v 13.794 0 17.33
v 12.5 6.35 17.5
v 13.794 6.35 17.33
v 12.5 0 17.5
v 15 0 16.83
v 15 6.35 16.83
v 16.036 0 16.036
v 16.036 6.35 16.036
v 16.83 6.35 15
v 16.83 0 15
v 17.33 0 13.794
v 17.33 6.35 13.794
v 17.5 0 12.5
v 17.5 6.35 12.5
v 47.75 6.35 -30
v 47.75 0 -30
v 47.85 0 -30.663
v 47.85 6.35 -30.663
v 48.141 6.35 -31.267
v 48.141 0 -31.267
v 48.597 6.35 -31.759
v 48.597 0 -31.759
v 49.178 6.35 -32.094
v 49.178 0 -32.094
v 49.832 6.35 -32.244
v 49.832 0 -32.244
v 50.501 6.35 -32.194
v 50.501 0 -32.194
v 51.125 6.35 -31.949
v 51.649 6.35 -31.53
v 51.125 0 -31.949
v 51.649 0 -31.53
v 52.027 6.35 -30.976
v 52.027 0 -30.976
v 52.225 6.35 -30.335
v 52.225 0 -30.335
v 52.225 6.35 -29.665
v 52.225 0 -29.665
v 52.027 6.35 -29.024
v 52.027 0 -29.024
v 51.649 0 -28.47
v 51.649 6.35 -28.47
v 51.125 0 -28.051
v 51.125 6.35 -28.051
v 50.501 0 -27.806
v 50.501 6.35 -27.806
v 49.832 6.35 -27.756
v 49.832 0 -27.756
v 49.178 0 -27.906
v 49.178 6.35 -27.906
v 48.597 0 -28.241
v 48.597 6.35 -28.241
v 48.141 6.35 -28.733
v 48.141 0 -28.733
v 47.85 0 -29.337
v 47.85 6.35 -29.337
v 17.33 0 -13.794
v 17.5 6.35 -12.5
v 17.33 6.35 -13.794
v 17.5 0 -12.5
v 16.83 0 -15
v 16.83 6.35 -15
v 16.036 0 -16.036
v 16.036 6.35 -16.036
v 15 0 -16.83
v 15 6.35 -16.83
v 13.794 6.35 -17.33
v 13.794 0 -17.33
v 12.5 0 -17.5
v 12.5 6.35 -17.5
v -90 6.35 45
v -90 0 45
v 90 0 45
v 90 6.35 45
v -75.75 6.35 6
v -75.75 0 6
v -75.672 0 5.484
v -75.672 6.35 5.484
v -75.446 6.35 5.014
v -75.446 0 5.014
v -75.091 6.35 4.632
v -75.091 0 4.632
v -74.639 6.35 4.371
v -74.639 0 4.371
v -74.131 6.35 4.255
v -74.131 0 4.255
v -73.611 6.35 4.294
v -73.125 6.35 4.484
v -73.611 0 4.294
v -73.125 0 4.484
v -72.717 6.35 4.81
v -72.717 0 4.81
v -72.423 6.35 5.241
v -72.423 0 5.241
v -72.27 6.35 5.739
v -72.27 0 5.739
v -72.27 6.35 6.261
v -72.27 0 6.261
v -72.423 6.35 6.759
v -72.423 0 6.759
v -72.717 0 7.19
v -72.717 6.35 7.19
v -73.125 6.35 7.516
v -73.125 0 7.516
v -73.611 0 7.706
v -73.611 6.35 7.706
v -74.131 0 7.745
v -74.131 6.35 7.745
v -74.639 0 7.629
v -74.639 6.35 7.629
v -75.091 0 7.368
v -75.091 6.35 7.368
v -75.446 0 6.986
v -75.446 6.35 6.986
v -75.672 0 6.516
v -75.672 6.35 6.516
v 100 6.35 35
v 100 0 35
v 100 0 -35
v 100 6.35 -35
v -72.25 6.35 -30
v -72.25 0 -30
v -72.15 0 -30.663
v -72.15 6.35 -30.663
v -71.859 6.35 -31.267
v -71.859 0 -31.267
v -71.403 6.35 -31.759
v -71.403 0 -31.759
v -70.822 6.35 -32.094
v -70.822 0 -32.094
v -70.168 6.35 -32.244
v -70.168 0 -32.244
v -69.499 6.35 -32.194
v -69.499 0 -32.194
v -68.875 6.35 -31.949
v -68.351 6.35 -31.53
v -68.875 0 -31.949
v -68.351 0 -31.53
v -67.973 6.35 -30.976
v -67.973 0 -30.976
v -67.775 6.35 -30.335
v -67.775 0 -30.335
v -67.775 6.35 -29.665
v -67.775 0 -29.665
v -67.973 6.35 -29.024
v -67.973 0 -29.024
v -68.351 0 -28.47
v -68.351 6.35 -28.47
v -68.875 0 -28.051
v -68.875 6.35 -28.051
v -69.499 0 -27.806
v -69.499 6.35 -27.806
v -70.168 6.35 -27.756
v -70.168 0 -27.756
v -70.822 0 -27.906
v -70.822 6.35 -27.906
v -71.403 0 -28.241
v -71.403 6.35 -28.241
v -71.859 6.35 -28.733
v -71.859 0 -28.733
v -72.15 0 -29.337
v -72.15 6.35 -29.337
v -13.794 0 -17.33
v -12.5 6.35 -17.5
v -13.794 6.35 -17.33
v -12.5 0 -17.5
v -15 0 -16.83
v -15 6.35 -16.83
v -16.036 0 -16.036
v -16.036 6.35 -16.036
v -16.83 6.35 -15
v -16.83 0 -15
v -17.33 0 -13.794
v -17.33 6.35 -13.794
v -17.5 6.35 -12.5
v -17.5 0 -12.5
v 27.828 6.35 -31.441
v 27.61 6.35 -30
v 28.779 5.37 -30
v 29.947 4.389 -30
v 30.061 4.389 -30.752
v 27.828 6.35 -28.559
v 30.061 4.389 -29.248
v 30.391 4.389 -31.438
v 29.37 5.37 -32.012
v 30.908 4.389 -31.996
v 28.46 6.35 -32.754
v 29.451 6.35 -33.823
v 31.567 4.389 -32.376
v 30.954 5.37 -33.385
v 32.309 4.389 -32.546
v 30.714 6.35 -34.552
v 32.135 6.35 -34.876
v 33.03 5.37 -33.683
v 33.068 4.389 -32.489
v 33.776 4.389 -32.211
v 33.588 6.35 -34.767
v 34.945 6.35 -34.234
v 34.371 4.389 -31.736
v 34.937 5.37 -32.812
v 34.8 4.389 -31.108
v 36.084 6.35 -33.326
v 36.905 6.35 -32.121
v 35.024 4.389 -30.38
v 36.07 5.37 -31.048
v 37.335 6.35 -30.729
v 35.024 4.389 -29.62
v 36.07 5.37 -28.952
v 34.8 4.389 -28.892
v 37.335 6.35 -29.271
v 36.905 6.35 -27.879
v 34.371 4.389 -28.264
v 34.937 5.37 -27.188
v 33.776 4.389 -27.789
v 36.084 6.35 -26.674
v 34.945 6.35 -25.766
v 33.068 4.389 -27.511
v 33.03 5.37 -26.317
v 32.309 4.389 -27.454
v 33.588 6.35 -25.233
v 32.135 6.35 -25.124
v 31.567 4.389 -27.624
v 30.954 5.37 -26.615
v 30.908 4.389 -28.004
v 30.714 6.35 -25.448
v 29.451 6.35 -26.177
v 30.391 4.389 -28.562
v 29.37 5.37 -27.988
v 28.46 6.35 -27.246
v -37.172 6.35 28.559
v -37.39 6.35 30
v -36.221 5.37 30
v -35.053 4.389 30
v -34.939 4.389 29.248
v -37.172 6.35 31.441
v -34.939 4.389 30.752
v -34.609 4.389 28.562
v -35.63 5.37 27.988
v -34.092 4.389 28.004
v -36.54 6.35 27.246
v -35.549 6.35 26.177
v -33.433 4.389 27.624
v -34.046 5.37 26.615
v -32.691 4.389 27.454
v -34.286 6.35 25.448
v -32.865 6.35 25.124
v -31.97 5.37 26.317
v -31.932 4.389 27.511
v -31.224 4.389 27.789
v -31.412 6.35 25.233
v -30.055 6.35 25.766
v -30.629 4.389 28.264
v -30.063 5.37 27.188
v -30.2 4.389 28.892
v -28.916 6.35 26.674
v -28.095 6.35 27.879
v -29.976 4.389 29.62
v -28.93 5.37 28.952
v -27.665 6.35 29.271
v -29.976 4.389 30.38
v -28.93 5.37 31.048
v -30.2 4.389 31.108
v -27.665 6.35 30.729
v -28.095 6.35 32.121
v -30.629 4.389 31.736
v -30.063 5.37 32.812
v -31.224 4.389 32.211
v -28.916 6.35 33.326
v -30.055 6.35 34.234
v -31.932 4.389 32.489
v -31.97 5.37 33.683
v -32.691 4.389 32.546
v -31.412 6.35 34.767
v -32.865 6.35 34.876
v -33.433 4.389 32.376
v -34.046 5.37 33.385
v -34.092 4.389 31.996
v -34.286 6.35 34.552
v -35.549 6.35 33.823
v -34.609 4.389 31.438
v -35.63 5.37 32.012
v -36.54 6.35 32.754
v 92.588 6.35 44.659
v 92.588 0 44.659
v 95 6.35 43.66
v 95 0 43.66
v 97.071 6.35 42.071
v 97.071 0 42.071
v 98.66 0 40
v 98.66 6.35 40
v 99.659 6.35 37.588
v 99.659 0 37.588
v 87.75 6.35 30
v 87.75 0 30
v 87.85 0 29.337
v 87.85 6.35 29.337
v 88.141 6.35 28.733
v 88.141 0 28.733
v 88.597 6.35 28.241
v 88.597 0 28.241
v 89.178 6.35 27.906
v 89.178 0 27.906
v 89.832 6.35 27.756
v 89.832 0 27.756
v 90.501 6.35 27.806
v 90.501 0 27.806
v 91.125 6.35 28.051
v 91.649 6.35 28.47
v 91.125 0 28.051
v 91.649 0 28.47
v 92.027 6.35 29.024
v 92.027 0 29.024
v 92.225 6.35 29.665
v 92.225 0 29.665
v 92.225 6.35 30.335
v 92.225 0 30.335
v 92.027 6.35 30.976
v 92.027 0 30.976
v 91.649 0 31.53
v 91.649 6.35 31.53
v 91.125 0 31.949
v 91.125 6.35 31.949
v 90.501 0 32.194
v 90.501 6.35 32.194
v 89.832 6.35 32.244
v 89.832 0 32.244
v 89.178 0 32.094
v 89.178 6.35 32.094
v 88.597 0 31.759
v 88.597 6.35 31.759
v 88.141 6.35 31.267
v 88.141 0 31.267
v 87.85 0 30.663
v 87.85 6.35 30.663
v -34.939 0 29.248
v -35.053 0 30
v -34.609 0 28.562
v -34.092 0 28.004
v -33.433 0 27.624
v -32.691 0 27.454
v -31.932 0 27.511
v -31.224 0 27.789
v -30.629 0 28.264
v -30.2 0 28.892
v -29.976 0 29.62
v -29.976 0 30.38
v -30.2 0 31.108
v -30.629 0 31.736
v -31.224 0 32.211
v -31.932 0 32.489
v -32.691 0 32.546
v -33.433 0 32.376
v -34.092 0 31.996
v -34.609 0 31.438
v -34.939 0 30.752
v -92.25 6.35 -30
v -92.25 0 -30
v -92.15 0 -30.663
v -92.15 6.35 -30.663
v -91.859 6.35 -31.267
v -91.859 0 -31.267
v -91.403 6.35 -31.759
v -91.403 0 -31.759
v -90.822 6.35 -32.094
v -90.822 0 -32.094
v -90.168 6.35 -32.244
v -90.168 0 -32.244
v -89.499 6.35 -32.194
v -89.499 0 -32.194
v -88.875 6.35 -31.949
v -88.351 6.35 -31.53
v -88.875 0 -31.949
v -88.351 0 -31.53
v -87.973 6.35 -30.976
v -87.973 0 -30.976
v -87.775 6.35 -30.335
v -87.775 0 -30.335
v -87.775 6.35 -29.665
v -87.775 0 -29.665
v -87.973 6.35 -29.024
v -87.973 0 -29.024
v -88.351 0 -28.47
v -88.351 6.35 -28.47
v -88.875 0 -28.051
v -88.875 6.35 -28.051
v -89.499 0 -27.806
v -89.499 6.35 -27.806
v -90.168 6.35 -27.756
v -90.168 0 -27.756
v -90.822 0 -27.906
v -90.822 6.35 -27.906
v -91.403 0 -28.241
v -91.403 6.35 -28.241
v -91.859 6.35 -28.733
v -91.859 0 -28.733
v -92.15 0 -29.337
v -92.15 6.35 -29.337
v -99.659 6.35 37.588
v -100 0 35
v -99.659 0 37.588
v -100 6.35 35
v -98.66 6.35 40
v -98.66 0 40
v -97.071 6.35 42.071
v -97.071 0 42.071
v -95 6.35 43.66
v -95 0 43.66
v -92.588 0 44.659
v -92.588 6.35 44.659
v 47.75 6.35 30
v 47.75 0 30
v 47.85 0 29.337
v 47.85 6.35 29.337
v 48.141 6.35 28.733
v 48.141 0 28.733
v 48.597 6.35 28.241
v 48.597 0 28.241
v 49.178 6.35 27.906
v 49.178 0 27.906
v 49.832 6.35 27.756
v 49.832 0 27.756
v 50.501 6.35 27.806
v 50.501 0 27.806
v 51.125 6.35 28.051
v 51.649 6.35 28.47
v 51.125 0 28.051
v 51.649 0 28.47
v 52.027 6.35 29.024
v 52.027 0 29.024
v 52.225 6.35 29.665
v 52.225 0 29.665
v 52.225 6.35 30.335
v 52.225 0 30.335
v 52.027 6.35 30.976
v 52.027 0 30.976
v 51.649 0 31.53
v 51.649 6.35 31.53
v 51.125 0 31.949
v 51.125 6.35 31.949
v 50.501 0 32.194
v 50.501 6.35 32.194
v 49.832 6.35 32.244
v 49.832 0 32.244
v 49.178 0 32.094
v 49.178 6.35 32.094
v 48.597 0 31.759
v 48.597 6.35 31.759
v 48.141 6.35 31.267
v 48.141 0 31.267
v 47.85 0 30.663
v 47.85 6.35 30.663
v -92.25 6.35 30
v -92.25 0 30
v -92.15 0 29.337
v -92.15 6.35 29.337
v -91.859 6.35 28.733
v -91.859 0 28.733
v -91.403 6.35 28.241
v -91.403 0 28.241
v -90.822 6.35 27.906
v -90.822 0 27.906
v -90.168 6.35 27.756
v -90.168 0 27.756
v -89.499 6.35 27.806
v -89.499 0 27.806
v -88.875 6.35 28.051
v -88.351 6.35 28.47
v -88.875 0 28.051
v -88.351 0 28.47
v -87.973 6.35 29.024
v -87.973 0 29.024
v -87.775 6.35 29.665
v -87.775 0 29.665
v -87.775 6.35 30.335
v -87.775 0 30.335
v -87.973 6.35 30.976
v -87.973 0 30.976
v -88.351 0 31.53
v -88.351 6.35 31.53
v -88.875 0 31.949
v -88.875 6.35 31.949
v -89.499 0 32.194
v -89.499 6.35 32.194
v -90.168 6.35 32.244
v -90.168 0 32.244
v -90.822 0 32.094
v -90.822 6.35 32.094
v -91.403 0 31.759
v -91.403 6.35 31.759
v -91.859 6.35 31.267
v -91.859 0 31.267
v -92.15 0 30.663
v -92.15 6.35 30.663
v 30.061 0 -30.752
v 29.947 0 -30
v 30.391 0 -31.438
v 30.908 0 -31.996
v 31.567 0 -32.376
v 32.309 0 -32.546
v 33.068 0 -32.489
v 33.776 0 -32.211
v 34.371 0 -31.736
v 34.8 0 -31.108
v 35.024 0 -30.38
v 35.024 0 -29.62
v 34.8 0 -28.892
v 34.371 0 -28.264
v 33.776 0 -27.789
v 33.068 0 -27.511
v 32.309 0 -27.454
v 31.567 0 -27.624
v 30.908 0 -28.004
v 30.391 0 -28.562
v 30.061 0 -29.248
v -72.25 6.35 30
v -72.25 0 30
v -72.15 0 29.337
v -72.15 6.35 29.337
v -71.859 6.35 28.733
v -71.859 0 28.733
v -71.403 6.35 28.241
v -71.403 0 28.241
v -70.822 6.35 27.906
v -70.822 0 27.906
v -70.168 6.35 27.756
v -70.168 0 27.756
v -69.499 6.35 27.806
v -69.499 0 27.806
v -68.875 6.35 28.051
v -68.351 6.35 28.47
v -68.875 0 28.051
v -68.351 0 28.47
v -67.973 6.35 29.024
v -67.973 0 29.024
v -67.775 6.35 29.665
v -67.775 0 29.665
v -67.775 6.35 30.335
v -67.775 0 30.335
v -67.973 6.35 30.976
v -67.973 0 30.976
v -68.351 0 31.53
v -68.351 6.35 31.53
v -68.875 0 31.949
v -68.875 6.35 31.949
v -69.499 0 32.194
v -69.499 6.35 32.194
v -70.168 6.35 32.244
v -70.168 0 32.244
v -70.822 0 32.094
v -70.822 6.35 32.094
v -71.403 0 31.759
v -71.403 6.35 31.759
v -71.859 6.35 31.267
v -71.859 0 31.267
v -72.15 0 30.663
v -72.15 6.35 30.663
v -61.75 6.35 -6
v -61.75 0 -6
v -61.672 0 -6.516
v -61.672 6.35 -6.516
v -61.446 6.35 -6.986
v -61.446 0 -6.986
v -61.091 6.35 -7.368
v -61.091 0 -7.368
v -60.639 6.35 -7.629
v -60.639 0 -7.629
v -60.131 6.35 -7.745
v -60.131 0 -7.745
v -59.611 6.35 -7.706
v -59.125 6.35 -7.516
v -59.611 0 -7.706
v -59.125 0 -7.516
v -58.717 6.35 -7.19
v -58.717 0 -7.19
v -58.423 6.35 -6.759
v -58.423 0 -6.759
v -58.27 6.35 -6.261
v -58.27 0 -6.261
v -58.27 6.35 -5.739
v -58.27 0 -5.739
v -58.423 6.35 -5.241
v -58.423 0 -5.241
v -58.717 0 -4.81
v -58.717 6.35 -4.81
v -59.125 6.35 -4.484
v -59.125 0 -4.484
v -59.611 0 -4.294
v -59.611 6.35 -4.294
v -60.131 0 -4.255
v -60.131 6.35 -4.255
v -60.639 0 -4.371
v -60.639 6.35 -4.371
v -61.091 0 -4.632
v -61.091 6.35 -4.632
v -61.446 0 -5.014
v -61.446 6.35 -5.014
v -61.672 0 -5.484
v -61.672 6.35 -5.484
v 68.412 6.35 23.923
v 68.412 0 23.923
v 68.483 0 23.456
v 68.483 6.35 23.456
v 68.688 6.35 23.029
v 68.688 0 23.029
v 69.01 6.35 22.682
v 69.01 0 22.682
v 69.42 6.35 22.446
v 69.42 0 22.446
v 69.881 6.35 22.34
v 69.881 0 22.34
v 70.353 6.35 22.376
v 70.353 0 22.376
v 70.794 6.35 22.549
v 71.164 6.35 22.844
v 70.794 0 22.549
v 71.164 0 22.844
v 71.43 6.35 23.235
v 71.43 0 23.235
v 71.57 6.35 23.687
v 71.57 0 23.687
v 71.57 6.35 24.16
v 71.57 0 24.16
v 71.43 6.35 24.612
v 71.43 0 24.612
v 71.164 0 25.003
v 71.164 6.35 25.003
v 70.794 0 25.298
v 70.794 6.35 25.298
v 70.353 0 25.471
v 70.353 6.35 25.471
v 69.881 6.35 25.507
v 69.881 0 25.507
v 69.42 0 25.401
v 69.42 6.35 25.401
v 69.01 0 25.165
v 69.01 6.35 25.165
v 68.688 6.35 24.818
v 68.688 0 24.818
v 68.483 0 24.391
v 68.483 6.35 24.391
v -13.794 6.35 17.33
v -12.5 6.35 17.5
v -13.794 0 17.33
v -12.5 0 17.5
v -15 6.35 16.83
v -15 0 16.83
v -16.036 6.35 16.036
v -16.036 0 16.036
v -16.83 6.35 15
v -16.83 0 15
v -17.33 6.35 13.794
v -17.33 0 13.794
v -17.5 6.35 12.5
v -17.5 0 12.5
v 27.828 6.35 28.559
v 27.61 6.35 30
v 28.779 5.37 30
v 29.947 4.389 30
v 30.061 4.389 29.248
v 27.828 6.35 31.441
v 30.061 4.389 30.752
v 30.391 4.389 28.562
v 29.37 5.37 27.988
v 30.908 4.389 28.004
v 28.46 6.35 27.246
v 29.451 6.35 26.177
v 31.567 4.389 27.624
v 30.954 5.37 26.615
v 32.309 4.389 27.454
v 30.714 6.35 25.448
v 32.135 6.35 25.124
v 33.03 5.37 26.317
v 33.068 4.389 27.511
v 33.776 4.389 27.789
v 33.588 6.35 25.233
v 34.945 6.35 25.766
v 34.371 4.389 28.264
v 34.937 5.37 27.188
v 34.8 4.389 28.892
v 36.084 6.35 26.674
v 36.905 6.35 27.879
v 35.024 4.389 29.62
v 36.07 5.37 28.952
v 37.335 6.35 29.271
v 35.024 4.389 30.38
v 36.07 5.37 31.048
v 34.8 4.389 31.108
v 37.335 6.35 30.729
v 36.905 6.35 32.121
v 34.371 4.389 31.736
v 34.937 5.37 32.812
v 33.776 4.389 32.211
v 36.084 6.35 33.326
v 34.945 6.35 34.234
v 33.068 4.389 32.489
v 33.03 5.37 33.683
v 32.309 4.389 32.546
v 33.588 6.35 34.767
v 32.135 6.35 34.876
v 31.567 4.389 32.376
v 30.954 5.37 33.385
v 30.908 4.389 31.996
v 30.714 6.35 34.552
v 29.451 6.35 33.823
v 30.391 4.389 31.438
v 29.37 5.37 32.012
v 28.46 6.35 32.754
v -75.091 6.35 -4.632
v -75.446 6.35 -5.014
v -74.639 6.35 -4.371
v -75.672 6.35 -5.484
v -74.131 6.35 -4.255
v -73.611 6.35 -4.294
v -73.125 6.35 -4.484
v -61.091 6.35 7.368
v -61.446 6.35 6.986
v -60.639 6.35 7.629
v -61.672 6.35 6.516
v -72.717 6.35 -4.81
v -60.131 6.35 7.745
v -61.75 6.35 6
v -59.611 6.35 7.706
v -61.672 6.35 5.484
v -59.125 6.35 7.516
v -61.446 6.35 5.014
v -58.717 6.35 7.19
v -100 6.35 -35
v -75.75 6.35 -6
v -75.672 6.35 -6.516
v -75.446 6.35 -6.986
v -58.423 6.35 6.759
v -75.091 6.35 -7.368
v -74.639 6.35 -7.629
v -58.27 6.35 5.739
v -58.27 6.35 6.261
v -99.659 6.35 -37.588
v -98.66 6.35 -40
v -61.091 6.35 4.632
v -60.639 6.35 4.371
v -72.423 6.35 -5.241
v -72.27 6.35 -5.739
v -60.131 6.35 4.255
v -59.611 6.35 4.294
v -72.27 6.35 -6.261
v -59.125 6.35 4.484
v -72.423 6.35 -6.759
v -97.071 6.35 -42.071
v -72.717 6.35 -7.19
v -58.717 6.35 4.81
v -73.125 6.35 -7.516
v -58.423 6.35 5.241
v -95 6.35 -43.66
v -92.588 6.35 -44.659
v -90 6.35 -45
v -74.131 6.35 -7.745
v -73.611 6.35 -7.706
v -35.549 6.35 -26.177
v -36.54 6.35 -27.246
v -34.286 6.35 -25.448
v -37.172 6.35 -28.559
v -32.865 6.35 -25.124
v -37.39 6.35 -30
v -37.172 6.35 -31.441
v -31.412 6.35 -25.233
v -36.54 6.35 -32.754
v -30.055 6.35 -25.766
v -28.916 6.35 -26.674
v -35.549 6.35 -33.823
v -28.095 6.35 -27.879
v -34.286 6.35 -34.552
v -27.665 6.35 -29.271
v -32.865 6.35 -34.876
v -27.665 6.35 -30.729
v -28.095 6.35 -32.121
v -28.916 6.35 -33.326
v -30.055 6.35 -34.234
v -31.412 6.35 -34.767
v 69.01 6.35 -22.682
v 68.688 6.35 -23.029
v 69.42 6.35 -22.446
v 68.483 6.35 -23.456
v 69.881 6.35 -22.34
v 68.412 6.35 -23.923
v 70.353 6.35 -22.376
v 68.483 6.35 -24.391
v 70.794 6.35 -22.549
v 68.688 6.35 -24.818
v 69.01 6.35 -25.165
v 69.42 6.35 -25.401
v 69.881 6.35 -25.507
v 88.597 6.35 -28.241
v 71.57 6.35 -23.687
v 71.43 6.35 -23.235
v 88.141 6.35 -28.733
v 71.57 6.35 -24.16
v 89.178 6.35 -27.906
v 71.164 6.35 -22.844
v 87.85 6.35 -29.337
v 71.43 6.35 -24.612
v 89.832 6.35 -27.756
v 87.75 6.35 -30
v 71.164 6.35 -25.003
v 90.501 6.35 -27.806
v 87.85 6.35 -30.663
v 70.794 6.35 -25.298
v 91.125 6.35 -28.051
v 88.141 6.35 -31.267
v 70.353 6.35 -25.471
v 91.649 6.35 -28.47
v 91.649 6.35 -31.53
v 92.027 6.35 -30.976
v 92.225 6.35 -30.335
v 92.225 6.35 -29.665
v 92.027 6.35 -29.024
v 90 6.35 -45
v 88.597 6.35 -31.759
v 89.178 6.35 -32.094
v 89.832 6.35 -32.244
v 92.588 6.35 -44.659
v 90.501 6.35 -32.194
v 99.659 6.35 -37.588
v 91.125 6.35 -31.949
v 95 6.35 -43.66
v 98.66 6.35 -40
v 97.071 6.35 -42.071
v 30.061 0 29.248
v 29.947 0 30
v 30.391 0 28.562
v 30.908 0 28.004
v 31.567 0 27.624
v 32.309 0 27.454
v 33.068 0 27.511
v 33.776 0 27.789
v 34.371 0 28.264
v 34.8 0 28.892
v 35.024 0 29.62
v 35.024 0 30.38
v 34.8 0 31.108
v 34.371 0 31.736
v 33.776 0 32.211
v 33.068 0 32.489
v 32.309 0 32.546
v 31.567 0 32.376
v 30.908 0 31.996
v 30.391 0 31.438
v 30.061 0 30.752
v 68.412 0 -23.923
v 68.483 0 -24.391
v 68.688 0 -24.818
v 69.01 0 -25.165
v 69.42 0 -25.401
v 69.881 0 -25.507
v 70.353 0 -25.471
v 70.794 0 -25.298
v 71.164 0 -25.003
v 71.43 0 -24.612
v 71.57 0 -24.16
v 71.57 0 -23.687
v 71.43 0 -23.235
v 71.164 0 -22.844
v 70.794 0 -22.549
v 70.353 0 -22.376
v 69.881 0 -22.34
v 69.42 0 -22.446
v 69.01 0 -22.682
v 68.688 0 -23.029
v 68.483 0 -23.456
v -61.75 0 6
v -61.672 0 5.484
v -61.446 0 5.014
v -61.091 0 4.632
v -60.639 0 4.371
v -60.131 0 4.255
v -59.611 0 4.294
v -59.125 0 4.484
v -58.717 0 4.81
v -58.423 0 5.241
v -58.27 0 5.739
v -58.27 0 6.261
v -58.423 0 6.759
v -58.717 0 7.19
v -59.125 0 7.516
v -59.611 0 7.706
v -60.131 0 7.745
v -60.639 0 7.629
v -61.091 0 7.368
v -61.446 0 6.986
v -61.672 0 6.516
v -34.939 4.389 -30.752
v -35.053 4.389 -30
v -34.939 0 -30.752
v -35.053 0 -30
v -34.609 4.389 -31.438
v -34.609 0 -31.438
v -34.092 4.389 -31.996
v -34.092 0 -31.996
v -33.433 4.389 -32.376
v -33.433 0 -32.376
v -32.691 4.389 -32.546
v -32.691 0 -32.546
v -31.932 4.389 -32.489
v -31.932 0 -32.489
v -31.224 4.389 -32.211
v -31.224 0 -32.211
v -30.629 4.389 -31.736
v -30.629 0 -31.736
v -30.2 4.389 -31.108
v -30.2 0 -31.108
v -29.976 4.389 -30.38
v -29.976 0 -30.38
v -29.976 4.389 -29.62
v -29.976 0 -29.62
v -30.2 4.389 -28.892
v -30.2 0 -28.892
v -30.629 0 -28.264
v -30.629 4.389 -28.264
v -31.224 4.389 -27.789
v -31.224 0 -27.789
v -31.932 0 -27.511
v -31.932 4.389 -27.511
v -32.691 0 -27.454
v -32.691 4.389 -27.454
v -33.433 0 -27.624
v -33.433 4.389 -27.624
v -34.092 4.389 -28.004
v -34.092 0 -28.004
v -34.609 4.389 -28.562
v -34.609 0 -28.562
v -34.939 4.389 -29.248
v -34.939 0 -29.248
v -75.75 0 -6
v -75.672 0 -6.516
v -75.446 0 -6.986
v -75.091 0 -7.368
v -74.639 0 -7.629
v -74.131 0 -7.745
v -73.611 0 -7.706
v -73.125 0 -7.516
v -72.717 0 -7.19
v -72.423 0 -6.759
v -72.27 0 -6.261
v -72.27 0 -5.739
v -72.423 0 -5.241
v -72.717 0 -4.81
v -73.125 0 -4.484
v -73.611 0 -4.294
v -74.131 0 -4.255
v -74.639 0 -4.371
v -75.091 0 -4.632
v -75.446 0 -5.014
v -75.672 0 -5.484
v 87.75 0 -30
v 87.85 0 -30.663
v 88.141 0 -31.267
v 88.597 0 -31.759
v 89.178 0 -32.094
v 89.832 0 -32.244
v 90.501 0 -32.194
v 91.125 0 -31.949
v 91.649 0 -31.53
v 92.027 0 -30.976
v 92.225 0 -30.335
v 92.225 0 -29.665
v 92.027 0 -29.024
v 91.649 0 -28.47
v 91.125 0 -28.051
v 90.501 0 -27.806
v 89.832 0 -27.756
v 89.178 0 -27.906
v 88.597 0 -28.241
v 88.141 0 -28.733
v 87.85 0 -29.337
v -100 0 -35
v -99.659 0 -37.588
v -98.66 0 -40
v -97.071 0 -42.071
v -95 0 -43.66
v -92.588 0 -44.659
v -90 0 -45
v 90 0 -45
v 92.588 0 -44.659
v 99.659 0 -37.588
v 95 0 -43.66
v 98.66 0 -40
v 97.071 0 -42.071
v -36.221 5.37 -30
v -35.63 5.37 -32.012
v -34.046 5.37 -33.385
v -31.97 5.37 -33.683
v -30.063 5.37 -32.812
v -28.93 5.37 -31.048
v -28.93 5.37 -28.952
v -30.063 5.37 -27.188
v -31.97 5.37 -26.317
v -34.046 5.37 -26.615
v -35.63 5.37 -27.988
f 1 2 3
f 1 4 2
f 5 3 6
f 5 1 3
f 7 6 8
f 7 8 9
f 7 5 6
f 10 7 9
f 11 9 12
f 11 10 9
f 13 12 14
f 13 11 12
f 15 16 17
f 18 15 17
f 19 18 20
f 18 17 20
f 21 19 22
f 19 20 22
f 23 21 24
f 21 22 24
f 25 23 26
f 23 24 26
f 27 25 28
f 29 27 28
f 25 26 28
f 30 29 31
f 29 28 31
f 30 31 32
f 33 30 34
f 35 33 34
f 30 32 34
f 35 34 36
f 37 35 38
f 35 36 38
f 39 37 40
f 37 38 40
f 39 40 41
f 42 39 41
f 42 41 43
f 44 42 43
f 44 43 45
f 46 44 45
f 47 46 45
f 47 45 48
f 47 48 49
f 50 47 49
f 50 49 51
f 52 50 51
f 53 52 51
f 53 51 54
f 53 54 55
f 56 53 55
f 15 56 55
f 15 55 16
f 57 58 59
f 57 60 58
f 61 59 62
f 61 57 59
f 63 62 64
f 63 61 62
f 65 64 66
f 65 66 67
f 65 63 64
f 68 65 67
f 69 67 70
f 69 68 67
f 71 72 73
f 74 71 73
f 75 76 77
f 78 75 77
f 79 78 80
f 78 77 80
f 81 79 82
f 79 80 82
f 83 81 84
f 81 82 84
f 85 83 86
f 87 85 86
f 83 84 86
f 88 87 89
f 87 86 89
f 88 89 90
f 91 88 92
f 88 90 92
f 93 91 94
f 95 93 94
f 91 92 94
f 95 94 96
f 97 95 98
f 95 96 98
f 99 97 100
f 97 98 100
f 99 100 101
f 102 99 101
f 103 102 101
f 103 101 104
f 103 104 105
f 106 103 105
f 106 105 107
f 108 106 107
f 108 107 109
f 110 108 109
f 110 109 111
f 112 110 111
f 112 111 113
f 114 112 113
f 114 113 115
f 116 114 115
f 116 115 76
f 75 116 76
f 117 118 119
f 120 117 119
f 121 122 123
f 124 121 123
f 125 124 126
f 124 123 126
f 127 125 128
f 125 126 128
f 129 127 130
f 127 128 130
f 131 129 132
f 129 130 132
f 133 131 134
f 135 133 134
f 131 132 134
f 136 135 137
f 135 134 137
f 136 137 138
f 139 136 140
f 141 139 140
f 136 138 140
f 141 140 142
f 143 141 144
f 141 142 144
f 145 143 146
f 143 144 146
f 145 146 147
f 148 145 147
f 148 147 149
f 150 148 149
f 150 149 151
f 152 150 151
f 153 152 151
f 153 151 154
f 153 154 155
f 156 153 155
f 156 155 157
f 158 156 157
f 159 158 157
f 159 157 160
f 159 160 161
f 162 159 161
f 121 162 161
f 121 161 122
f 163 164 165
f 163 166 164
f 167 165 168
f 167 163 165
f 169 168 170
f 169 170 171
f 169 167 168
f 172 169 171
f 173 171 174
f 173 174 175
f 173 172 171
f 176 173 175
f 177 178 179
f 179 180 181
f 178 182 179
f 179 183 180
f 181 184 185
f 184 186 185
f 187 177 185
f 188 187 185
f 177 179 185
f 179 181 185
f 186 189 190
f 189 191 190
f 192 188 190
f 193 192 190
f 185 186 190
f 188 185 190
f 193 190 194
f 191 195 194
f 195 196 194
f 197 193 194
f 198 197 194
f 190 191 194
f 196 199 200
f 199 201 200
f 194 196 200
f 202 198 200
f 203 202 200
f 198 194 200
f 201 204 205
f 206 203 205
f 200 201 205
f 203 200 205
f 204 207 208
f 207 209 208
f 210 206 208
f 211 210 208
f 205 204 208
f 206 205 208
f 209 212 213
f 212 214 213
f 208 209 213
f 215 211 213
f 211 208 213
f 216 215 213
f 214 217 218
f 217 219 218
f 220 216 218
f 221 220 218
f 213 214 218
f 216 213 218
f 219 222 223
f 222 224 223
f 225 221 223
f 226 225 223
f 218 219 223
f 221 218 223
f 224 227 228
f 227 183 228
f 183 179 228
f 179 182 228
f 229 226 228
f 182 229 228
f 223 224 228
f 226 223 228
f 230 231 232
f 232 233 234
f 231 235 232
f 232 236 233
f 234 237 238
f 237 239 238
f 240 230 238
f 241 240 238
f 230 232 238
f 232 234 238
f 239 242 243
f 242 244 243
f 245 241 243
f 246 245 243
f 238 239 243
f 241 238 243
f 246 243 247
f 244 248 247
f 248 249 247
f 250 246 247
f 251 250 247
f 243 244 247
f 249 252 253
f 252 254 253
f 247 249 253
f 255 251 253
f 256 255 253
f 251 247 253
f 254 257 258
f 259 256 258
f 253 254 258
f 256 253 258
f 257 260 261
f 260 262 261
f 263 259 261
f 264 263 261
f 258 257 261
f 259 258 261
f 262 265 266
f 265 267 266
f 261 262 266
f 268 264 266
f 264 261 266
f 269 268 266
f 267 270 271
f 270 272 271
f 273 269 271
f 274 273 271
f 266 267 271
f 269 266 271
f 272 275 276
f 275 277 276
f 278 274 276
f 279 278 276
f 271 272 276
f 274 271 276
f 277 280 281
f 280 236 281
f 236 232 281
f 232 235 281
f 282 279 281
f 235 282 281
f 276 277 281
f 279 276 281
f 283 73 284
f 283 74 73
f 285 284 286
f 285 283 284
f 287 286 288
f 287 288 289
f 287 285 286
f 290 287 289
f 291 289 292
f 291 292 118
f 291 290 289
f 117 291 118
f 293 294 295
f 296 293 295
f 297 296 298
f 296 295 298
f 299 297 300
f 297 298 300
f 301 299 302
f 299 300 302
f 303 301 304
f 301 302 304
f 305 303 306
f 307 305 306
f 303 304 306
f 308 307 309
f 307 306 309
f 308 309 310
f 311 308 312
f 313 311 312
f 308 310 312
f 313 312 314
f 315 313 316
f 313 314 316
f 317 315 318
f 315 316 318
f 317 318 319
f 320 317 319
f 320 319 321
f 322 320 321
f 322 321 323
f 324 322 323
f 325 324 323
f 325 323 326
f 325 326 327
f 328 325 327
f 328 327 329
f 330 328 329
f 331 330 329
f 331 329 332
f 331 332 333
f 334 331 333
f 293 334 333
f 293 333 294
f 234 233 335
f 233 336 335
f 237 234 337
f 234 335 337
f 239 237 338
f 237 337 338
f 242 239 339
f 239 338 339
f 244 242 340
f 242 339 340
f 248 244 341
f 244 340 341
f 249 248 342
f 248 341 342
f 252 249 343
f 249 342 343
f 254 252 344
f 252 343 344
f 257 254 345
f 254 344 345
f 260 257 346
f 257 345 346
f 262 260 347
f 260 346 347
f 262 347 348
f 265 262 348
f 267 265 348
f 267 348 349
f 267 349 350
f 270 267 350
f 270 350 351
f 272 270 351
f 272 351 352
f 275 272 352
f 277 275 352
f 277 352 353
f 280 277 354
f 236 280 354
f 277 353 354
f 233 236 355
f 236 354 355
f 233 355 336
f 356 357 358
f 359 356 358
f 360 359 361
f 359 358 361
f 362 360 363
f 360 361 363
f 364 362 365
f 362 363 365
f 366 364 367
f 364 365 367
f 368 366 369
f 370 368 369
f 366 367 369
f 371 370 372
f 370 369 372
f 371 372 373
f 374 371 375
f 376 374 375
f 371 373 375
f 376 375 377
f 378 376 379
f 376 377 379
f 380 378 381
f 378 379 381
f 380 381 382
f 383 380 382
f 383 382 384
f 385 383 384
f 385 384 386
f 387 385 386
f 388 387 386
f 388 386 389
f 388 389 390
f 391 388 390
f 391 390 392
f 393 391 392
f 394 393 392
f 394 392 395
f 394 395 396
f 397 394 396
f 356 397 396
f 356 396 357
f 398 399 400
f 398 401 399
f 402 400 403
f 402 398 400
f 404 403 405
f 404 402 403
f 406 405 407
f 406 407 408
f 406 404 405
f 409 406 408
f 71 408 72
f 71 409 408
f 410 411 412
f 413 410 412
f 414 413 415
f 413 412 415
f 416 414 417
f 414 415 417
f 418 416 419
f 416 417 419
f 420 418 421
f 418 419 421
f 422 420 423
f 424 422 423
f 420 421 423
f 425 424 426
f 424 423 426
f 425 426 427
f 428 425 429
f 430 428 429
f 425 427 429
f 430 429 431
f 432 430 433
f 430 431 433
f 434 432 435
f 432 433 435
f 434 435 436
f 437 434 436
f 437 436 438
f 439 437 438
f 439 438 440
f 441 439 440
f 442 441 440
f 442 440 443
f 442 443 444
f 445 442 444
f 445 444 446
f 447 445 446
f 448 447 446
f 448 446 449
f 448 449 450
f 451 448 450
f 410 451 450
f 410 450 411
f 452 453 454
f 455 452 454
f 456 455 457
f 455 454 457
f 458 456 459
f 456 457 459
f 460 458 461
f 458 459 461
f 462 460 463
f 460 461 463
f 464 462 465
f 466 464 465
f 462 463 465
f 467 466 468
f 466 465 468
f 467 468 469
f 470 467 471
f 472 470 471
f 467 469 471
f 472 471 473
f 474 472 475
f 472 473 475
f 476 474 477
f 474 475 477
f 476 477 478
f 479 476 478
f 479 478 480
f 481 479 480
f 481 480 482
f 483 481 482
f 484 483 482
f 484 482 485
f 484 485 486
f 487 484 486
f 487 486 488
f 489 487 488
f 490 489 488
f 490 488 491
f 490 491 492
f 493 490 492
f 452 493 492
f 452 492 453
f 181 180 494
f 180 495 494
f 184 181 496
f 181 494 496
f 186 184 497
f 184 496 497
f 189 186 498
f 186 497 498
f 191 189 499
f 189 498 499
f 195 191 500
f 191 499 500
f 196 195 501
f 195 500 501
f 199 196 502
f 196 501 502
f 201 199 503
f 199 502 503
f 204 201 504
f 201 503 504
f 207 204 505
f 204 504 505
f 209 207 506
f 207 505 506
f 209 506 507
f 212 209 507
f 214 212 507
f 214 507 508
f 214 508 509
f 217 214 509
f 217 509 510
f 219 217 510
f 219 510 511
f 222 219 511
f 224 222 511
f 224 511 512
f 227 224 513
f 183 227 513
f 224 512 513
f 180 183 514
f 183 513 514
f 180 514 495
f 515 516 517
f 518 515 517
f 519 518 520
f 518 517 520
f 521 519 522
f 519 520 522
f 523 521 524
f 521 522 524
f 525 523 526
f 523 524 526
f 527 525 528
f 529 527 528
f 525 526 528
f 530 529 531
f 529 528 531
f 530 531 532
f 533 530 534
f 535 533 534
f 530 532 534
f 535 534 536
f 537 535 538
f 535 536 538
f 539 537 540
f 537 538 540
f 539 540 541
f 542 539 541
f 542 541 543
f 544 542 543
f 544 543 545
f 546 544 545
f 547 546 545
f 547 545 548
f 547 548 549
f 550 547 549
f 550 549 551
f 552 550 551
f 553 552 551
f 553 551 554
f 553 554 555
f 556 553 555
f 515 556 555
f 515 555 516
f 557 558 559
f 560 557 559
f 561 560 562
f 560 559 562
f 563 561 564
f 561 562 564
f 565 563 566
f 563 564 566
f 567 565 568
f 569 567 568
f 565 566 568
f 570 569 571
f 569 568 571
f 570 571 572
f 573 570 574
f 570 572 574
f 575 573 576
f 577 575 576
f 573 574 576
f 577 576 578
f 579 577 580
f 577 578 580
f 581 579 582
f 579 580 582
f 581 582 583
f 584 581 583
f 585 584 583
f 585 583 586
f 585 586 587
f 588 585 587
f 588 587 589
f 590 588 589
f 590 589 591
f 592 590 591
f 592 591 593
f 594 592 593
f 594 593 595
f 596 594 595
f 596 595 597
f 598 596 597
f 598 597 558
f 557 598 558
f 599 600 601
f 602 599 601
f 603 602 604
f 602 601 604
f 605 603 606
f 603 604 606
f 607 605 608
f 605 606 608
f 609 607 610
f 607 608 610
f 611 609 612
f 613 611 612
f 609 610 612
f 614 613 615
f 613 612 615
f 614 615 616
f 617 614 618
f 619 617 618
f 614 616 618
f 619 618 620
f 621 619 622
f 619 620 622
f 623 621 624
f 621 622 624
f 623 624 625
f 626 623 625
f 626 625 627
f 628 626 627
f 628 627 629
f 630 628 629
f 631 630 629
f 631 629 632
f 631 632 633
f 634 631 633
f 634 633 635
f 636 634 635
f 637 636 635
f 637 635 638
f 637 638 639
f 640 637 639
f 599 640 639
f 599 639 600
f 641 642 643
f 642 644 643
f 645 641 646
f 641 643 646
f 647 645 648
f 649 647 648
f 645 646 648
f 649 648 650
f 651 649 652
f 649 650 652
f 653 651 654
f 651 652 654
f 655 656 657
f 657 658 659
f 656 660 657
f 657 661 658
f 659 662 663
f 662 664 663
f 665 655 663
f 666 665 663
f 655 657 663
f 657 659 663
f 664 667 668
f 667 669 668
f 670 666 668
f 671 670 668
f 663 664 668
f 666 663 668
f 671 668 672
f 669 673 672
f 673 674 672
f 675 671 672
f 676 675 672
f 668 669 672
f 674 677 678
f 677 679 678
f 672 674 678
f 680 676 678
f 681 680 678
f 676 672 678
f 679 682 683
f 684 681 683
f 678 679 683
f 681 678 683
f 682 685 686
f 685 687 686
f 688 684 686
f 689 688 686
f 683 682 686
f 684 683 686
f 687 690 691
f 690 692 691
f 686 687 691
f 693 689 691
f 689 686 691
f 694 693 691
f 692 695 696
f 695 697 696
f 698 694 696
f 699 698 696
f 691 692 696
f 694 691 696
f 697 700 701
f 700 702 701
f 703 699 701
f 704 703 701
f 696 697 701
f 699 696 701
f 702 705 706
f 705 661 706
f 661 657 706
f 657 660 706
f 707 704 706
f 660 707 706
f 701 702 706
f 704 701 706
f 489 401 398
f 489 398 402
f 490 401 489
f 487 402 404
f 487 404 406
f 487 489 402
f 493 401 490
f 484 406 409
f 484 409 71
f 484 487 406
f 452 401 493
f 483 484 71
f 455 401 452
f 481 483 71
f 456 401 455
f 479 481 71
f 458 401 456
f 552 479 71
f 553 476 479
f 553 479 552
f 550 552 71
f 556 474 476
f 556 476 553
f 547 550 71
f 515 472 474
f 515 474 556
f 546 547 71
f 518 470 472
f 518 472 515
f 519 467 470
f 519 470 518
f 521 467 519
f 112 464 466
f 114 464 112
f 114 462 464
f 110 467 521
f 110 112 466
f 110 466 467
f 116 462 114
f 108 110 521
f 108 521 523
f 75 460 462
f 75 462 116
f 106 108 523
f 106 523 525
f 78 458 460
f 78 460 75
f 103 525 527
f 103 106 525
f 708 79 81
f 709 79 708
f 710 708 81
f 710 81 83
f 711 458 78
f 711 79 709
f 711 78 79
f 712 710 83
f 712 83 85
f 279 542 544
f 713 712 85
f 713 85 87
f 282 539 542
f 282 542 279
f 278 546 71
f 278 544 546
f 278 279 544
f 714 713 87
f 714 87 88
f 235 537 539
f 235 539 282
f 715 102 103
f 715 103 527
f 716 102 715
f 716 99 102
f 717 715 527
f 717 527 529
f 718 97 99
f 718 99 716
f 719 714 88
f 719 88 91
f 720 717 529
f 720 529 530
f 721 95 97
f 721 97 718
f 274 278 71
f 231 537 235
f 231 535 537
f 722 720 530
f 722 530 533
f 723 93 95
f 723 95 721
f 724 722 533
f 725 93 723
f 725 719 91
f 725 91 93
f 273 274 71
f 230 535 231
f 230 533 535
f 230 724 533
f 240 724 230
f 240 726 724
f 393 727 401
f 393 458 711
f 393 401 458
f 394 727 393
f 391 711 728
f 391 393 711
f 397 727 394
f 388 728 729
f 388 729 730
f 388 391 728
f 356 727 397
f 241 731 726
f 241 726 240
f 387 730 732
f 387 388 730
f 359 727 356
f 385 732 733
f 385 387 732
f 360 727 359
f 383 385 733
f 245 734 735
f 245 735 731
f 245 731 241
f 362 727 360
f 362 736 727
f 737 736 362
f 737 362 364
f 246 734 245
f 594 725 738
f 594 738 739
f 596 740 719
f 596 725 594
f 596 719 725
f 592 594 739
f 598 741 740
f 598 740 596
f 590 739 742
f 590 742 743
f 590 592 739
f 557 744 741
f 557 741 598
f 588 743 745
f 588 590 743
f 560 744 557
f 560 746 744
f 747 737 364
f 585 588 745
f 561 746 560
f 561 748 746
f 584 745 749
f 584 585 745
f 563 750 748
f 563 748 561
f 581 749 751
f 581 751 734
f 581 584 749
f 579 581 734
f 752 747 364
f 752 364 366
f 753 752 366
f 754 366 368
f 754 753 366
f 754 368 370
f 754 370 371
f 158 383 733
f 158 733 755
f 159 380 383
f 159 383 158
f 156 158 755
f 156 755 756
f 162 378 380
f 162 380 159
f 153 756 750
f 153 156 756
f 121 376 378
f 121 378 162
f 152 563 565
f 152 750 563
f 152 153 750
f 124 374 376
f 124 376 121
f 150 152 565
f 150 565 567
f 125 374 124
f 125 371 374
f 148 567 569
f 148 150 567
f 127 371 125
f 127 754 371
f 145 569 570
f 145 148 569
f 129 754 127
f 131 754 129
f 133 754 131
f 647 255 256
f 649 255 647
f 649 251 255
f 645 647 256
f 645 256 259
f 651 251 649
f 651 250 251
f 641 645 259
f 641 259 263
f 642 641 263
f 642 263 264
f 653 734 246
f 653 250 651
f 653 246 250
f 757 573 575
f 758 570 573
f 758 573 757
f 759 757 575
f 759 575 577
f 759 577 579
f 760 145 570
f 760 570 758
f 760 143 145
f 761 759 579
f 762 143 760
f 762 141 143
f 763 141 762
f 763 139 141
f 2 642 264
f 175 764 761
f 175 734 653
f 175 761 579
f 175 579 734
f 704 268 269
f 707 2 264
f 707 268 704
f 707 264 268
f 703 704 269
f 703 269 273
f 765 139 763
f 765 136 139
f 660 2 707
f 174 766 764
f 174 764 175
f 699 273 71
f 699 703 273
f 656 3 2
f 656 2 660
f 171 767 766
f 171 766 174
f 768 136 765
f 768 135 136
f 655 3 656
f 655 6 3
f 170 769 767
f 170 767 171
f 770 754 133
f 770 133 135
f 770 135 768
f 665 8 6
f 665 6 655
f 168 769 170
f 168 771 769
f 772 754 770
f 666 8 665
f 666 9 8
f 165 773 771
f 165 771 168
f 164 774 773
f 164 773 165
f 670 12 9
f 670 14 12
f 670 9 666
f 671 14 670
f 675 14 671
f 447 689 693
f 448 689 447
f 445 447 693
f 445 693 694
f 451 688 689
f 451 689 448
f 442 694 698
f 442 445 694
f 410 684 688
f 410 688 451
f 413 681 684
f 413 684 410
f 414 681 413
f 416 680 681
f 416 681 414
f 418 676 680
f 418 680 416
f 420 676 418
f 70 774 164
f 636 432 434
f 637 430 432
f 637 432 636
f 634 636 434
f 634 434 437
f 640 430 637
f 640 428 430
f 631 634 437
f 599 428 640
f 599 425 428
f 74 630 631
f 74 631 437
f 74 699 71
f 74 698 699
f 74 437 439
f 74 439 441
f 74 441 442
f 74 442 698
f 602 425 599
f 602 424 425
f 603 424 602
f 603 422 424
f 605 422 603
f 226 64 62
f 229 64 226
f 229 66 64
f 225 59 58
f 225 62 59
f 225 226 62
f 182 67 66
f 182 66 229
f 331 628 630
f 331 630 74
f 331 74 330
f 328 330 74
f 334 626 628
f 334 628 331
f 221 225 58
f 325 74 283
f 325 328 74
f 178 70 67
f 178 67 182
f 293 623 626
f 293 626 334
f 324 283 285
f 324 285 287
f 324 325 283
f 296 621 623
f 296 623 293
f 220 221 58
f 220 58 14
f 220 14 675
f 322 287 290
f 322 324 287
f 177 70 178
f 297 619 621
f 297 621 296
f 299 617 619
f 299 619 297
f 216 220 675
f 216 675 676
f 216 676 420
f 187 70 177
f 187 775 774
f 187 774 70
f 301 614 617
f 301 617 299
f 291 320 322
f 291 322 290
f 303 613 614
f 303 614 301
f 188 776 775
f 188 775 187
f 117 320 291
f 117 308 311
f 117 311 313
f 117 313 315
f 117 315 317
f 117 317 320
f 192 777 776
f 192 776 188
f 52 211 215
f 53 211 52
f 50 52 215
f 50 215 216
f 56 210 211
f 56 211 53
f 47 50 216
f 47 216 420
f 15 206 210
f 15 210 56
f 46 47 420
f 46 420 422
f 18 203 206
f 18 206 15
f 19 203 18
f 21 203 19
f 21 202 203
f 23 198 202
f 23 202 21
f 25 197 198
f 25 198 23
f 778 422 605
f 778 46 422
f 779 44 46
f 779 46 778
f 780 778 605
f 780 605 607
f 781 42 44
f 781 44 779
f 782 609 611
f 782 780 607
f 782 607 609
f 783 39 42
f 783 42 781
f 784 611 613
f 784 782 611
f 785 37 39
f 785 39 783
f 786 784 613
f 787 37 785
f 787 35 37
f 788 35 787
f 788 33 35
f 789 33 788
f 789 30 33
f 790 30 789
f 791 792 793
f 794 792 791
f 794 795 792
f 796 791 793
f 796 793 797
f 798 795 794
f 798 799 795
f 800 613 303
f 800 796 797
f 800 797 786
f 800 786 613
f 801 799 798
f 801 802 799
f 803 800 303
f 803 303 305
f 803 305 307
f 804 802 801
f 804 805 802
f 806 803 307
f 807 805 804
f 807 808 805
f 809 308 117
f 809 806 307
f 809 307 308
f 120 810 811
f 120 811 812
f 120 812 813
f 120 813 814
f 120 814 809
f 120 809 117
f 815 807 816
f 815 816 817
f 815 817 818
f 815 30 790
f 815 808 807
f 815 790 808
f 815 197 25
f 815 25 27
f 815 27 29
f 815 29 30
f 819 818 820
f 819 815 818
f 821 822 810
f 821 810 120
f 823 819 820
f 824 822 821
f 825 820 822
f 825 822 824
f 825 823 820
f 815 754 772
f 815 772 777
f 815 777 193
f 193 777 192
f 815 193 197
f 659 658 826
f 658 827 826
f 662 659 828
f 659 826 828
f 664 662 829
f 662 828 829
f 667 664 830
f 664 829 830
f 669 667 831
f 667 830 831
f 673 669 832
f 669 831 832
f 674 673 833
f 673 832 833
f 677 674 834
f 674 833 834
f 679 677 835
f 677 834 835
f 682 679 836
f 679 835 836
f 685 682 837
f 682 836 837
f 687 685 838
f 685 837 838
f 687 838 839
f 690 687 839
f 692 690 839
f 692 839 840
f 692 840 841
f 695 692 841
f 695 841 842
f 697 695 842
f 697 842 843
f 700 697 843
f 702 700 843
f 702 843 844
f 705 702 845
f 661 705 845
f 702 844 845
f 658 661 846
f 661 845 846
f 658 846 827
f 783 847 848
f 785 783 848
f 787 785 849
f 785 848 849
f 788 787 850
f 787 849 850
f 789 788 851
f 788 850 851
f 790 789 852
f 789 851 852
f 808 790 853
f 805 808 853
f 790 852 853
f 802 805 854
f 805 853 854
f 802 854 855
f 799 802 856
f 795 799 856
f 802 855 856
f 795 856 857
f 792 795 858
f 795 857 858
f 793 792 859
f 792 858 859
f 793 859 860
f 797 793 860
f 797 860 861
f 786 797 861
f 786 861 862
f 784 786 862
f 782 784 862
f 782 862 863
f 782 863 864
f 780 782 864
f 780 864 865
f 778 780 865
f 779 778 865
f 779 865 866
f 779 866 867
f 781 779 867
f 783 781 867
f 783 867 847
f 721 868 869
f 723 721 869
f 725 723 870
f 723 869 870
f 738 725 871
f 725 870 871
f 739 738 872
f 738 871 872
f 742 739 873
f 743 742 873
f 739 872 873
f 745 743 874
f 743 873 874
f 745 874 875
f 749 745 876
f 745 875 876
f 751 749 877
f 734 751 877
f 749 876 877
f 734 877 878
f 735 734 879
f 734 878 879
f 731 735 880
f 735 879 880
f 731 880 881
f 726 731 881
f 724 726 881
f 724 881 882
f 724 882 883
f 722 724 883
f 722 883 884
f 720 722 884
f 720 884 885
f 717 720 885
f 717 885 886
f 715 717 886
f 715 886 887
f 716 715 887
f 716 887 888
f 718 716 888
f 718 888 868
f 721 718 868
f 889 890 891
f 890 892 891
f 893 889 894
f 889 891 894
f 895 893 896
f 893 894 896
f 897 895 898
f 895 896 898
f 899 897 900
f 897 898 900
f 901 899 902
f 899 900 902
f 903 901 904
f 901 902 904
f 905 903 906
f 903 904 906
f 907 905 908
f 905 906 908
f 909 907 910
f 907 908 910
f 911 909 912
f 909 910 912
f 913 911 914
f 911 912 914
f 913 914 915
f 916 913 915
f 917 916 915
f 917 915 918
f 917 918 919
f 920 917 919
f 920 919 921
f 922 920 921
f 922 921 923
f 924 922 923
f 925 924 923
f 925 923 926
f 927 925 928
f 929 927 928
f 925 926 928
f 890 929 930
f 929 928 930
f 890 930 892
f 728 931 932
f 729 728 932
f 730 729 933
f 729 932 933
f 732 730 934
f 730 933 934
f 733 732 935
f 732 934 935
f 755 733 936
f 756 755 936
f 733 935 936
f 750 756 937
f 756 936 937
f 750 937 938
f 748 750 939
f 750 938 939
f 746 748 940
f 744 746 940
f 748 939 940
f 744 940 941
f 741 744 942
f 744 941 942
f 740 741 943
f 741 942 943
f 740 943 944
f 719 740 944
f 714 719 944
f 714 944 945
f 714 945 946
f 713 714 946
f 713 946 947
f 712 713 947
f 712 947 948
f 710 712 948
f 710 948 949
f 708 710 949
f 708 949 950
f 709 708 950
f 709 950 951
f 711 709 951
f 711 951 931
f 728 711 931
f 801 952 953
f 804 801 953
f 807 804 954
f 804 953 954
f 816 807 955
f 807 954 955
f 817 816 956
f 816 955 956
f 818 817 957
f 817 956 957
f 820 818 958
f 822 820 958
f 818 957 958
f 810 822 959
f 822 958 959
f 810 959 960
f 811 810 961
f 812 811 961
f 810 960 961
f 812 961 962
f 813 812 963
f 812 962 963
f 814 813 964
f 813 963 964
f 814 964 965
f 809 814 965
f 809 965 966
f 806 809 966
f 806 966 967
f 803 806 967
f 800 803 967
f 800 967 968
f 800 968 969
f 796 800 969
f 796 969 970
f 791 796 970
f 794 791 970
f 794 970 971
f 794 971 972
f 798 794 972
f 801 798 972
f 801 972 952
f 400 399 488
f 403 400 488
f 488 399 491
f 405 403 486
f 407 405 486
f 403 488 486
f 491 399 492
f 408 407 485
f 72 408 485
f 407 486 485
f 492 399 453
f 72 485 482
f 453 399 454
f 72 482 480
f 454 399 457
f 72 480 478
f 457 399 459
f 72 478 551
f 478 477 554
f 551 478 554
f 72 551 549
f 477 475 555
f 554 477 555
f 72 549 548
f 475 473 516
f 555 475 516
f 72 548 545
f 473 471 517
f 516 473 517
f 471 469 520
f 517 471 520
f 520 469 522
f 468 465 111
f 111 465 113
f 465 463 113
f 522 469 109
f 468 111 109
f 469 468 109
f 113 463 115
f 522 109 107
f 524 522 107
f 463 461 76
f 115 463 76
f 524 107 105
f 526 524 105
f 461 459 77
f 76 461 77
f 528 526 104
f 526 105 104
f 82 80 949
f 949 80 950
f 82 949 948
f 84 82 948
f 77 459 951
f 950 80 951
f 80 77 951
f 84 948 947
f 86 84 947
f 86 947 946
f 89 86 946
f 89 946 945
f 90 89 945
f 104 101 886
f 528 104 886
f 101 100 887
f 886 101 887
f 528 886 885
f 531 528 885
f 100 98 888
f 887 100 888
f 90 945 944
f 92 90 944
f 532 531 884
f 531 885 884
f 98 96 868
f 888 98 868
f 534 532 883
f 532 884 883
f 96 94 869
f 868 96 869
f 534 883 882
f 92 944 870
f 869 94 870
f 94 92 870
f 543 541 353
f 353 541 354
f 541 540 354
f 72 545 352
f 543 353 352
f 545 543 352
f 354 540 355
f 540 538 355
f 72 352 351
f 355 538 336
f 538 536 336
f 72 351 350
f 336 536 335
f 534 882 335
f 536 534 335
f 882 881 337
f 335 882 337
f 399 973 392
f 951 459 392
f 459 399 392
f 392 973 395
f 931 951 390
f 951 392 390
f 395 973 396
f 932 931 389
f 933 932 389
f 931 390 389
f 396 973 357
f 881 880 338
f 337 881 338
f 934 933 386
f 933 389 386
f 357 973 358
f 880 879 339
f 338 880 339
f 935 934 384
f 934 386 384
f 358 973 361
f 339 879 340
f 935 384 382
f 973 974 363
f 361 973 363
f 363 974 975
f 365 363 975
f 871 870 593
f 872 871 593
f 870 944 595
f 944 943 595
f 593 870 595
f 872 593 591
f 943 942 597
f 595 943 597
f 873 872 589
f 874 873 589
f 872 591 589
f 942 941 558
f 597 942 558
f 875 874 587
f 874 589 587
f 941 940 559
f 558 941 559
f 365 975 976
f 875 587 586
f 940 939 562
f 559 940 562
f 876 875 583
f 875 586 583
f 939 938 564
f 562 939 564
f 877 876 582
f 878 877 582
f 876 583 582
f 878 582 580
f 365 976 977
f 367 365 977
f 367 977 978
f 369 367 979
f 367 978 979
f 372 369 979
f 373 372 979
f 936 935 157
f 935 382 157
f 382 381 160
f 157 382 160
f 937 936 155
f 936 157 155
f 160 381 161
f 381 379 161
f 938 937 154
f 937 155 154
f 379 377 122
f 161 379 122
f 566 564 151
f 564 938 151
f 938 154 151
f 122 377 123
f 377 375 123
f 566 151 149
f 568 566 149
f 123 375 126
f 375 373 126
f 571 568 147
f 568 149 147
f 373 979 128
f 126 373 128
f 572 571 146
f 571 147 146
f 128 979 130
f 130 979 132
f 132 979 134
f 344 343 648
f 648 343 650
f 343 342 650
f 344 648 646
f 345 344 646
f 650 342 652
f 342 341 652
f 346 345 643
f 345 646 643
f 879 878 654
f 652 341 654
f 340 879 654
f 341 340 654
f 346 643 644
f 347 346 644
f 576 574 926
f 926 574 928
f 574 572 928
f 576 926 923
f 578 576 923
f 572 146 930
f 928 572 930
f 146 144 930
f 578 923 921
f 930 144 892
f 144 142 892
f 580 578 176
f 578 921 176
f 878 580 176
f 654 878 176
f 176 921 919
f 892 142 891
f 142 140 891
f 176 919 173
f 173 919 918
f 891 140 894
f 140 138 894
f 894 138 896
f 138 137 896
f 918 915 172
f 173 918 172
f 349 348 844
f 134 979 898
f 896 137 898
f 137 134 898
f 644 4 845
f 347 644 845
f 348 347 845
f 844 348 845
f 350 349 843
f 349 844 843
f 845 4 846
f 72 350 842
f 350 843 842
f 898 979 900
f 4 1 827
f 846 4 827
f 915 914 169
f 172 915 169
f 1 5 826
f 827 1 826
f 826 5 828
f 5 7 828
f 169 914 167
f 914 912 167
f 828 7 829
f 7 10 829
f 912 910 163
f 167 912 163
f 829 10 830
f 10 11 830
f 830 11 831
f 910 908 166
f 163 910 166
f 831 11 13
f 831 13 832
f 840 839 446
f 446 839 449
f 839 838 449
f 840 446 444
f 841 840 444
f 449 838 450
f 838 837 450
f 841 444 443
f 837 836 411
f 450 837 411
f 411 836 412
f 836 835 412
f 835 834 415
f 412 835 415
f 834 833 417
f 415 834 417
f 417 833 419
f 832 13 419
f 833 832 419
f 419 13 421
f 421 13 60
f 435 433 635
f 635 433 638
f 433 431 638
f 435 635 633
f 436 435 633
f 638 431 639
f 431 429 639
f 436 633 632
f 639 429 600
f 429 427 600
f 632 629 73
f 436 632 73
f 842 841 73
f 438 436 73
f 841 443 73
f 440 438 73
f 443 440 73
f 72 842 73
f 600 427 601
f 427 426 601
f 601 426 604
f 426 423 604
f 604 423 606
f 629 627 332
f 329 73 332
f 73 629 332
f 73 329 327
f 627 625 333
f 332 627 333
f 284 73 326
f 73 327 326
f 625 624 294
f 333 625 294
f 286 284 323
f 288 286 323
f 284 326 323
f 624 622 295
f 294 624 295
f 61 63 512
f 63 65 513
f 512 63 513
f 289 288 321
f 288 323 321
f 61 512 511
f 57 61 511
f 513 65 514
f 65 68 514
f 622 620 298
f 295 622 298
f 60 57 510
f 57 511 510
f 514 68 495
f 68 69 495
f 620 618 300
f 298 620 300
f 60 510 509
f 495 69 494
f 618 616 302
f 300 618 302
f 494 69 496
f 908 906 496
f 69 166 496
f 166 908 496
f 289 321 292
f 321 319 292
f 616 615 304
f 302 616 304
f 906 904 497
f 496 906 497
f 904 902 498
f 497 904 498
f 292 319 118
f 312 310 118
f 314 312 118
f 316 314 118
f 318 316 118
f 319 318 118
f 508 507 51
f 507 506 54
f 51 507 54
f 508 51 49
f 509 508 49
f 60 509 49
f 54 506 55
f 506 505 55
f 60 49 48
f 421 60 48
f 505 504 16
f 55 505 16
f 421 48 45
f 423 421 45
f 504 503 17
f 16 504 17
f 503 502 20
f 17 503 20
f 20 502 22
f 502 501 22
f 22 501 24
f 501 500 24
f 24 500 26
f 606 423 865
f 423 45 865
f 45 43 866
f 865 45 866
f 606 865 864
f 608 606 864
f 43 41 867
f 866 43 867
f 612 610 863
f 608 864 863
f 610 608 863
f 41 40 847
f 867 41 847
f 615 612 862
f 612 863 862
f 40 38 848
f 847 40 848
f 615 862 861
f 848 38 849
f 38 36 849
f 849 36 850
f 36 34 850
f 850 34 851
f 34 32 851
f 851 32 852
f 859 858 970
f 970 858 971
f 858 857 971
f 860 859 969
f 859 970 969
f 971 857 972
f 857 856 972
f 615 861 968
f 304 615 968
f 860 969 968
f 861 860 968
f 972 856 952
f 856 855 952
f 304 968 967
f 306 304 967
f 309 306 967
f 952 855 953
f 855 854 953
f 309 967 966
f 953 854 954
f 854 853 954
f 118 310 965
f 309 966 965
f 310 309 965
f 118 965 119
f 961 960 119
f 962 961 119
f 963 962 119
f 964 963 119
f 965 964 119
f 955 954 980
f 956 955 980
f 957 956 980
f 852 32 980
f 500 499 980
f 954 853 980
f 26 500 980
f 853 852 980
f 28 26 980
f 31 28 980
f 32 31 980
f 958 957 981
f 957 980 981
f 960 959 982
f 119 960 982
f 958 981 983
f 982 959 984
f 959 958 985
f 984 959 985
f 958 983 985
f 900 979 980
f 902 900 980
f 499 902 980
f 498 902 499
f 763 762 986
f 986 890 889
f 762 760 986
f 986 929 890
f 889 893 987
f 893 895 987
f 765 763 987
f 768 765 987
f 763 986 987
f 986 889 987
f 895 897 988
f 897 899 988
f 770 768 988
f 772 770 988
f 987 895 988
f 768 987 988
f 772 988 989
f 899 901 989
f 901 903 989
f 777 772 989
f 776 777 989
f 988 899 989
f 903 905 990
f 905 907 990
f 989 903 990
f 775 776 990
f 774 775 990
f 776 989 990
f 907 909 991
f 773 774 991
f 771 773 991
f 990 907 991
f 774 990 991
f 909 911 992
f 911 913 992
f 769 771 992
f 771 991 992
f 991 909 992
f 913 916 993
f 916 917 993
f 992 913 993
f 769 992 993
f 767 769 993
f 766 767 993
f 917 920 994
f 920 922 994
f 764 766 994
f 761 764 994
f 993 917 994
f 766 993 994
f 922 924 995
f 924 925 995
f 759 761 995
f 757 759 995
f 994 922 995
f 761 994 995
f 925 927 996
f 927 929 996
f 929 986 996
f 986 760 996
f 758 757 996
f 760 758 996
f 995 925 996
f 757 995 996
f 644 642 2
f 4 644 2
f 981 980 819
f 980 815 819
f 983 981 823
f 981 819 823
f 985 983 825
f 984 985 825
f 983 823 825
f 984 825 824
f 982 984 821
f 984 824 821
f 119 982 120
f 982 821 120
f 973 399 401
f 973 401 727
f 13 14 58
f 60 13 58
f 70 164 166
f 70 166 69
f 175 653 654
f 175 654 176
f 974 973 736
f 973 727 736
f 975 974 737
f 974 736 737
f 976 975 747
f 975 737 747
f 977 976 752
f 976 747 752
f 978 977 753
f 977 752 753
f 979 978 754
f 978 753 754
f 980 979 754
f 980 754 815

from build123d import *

# Parameters (mm, degrees)
SKETCH1_W                                          = 200
SKETCH1_H                                          = 90
BOSS_EXTRUDE1_DEPTH                                = 6.35
CSK_FOR_10_FLAT_HEAD_MACHINE_SCREW_100_D           = 5.1054
CSK_FOR_10_FLAT_HEAD_MACHINE_SCREW_100_CSINK_D     = 9.779
CSK_FOR_10_FLAT_HEAD_MACHINE_SCREW_100_CSINK_ANGLE = 100
M4_CLEARANCE_HOLE1_D                               = 4.5
SKETCH9_W                                          = 35
SKETCH9_H                                          = 35
CUT_EXTRUDE1_DEPTH                                 = 6.35
FILLET1_R                                          = 10
FILLET2_R                                          = 5
F_8_32_TAPPED_HOLE1_D                              = 3.175
SKETCH15_R                                         = 1.75
CUT_EXTRUDE2_DEPTH                                 = 7.35


with BuildPart() as part:
    # Sketch1 → Boss-Extrude1 (new body)
    with BuildSketch(Plane(origin=(0, 0, 0), x_dir=(1, 0, 0), z_dir=(0, 1, 0))):
        Rectangle(SKETCH1_W, SKETCH1_H)
    extrude(amount=BOSS_EXTRUDE1_DEPTH)

    # CSK for #10 Flat Head Machine Screw (100)1 (through all)
    with Locations(Plane(origin=(0, 6.35, 0), x_dir=(1, 0, 0), z_dir=(0, 1, 0))):
        with Locations((-32.5, 30), (-32.5, -30), (32.5, -30), (32.5, 30)):
            CounterSinkHole(CSK_FOR_10_FLAT_HEAD_MACHINE_SCREW_100_D / 2, CSK_FOR_10_FLAT_HEAD_MACHINE_SCREW_100_CSINK_D / 2, counter_sink_angle=CSK_FOR_10_FLAT_HEAD_MACHINE_SCREW_100_CSINK_ANGLE)

    # M4 Clearance Hole1 (through all)
    with Locations(Plane(origin=(0, 6.35, 0), x_dir=(1, 0, 0), z_dir=(0, 1, 0))):
        with Locations((-90, -30), (-90, 30), (90, 30), (90, -30), (-70, -30), (-70, 30), (50, 30), (50, -30)):
            Hole(M4_CLEARANCE_HOLE1_D / 2)

    # Sketch9 → Cut-Extrude1 (cut)
    with BuildSketch(Plane(origin=(0, 6.35, 0), x_dir=(1, 0, 0), z_dir=(0, 1, 0))):
        Rectangle(SKETCH9_W, SKETCH9_H)
    extrude(amount=-CUT_EXTRUDE1_DEPTH, mode=Mode.SUBTRACT)

    # Fillet1
    fillet1_edges = [part.edges().sort_by_distance(p)[0] for p in [
        (100, 3.175, 45),
        (-100, 3.175, 45),
        (-100, 3.175, -45),
        (100, 3.175, -45),
    ]]
    fillet(fillet1_edges, radius=FILLET1_R)

    # Fillet2
    fillet2_edges = [part.edges().sort_by_distance(p)[0] for p in [
        (17.5, 3.175, -17.5),
        (17.5, 3.175, 17.5),
        (-17.5, 3.175, 17.5),
        (-17.5, 3.175, -17.5),
    ]]
    fillet(fillet2_edges, radius=FILLET2_R)

    # #8-32 Tapped Hole1 (through all)
    with Locations(Plane(origin=(0, 6.35, 0), x_dir=(1, 0, 0), z_dir=(0, 1, 0))):
        with Locations((70, 23.923457084), (70, -23.923457084)):
            Hole(F_8_32_TAPPED_HOLE1_D / 2)

    # Sketch15 → Cut-Extrude2 (cut, through all)
    with BuildSketch(Plane(origin=(0, 0, 0), x_dir=(-1, 0, 0), z_dir=(0, -1, 0))):
        with Locations((74, 6)):
            Circle(SKETCH15_R)
        with Locations((60, 6)):
            Circle(SKETCH15_R)
        with Locations((60, -6)):
            Circle(SKETCH15_R)
        with Locations((74, -6)):
            Circle(SKETCH15_R)
    extrude(amount=-CUT_EXTRUDE2_DEPTH, mode=Mode.SUBTRACT)


solid = part.part
